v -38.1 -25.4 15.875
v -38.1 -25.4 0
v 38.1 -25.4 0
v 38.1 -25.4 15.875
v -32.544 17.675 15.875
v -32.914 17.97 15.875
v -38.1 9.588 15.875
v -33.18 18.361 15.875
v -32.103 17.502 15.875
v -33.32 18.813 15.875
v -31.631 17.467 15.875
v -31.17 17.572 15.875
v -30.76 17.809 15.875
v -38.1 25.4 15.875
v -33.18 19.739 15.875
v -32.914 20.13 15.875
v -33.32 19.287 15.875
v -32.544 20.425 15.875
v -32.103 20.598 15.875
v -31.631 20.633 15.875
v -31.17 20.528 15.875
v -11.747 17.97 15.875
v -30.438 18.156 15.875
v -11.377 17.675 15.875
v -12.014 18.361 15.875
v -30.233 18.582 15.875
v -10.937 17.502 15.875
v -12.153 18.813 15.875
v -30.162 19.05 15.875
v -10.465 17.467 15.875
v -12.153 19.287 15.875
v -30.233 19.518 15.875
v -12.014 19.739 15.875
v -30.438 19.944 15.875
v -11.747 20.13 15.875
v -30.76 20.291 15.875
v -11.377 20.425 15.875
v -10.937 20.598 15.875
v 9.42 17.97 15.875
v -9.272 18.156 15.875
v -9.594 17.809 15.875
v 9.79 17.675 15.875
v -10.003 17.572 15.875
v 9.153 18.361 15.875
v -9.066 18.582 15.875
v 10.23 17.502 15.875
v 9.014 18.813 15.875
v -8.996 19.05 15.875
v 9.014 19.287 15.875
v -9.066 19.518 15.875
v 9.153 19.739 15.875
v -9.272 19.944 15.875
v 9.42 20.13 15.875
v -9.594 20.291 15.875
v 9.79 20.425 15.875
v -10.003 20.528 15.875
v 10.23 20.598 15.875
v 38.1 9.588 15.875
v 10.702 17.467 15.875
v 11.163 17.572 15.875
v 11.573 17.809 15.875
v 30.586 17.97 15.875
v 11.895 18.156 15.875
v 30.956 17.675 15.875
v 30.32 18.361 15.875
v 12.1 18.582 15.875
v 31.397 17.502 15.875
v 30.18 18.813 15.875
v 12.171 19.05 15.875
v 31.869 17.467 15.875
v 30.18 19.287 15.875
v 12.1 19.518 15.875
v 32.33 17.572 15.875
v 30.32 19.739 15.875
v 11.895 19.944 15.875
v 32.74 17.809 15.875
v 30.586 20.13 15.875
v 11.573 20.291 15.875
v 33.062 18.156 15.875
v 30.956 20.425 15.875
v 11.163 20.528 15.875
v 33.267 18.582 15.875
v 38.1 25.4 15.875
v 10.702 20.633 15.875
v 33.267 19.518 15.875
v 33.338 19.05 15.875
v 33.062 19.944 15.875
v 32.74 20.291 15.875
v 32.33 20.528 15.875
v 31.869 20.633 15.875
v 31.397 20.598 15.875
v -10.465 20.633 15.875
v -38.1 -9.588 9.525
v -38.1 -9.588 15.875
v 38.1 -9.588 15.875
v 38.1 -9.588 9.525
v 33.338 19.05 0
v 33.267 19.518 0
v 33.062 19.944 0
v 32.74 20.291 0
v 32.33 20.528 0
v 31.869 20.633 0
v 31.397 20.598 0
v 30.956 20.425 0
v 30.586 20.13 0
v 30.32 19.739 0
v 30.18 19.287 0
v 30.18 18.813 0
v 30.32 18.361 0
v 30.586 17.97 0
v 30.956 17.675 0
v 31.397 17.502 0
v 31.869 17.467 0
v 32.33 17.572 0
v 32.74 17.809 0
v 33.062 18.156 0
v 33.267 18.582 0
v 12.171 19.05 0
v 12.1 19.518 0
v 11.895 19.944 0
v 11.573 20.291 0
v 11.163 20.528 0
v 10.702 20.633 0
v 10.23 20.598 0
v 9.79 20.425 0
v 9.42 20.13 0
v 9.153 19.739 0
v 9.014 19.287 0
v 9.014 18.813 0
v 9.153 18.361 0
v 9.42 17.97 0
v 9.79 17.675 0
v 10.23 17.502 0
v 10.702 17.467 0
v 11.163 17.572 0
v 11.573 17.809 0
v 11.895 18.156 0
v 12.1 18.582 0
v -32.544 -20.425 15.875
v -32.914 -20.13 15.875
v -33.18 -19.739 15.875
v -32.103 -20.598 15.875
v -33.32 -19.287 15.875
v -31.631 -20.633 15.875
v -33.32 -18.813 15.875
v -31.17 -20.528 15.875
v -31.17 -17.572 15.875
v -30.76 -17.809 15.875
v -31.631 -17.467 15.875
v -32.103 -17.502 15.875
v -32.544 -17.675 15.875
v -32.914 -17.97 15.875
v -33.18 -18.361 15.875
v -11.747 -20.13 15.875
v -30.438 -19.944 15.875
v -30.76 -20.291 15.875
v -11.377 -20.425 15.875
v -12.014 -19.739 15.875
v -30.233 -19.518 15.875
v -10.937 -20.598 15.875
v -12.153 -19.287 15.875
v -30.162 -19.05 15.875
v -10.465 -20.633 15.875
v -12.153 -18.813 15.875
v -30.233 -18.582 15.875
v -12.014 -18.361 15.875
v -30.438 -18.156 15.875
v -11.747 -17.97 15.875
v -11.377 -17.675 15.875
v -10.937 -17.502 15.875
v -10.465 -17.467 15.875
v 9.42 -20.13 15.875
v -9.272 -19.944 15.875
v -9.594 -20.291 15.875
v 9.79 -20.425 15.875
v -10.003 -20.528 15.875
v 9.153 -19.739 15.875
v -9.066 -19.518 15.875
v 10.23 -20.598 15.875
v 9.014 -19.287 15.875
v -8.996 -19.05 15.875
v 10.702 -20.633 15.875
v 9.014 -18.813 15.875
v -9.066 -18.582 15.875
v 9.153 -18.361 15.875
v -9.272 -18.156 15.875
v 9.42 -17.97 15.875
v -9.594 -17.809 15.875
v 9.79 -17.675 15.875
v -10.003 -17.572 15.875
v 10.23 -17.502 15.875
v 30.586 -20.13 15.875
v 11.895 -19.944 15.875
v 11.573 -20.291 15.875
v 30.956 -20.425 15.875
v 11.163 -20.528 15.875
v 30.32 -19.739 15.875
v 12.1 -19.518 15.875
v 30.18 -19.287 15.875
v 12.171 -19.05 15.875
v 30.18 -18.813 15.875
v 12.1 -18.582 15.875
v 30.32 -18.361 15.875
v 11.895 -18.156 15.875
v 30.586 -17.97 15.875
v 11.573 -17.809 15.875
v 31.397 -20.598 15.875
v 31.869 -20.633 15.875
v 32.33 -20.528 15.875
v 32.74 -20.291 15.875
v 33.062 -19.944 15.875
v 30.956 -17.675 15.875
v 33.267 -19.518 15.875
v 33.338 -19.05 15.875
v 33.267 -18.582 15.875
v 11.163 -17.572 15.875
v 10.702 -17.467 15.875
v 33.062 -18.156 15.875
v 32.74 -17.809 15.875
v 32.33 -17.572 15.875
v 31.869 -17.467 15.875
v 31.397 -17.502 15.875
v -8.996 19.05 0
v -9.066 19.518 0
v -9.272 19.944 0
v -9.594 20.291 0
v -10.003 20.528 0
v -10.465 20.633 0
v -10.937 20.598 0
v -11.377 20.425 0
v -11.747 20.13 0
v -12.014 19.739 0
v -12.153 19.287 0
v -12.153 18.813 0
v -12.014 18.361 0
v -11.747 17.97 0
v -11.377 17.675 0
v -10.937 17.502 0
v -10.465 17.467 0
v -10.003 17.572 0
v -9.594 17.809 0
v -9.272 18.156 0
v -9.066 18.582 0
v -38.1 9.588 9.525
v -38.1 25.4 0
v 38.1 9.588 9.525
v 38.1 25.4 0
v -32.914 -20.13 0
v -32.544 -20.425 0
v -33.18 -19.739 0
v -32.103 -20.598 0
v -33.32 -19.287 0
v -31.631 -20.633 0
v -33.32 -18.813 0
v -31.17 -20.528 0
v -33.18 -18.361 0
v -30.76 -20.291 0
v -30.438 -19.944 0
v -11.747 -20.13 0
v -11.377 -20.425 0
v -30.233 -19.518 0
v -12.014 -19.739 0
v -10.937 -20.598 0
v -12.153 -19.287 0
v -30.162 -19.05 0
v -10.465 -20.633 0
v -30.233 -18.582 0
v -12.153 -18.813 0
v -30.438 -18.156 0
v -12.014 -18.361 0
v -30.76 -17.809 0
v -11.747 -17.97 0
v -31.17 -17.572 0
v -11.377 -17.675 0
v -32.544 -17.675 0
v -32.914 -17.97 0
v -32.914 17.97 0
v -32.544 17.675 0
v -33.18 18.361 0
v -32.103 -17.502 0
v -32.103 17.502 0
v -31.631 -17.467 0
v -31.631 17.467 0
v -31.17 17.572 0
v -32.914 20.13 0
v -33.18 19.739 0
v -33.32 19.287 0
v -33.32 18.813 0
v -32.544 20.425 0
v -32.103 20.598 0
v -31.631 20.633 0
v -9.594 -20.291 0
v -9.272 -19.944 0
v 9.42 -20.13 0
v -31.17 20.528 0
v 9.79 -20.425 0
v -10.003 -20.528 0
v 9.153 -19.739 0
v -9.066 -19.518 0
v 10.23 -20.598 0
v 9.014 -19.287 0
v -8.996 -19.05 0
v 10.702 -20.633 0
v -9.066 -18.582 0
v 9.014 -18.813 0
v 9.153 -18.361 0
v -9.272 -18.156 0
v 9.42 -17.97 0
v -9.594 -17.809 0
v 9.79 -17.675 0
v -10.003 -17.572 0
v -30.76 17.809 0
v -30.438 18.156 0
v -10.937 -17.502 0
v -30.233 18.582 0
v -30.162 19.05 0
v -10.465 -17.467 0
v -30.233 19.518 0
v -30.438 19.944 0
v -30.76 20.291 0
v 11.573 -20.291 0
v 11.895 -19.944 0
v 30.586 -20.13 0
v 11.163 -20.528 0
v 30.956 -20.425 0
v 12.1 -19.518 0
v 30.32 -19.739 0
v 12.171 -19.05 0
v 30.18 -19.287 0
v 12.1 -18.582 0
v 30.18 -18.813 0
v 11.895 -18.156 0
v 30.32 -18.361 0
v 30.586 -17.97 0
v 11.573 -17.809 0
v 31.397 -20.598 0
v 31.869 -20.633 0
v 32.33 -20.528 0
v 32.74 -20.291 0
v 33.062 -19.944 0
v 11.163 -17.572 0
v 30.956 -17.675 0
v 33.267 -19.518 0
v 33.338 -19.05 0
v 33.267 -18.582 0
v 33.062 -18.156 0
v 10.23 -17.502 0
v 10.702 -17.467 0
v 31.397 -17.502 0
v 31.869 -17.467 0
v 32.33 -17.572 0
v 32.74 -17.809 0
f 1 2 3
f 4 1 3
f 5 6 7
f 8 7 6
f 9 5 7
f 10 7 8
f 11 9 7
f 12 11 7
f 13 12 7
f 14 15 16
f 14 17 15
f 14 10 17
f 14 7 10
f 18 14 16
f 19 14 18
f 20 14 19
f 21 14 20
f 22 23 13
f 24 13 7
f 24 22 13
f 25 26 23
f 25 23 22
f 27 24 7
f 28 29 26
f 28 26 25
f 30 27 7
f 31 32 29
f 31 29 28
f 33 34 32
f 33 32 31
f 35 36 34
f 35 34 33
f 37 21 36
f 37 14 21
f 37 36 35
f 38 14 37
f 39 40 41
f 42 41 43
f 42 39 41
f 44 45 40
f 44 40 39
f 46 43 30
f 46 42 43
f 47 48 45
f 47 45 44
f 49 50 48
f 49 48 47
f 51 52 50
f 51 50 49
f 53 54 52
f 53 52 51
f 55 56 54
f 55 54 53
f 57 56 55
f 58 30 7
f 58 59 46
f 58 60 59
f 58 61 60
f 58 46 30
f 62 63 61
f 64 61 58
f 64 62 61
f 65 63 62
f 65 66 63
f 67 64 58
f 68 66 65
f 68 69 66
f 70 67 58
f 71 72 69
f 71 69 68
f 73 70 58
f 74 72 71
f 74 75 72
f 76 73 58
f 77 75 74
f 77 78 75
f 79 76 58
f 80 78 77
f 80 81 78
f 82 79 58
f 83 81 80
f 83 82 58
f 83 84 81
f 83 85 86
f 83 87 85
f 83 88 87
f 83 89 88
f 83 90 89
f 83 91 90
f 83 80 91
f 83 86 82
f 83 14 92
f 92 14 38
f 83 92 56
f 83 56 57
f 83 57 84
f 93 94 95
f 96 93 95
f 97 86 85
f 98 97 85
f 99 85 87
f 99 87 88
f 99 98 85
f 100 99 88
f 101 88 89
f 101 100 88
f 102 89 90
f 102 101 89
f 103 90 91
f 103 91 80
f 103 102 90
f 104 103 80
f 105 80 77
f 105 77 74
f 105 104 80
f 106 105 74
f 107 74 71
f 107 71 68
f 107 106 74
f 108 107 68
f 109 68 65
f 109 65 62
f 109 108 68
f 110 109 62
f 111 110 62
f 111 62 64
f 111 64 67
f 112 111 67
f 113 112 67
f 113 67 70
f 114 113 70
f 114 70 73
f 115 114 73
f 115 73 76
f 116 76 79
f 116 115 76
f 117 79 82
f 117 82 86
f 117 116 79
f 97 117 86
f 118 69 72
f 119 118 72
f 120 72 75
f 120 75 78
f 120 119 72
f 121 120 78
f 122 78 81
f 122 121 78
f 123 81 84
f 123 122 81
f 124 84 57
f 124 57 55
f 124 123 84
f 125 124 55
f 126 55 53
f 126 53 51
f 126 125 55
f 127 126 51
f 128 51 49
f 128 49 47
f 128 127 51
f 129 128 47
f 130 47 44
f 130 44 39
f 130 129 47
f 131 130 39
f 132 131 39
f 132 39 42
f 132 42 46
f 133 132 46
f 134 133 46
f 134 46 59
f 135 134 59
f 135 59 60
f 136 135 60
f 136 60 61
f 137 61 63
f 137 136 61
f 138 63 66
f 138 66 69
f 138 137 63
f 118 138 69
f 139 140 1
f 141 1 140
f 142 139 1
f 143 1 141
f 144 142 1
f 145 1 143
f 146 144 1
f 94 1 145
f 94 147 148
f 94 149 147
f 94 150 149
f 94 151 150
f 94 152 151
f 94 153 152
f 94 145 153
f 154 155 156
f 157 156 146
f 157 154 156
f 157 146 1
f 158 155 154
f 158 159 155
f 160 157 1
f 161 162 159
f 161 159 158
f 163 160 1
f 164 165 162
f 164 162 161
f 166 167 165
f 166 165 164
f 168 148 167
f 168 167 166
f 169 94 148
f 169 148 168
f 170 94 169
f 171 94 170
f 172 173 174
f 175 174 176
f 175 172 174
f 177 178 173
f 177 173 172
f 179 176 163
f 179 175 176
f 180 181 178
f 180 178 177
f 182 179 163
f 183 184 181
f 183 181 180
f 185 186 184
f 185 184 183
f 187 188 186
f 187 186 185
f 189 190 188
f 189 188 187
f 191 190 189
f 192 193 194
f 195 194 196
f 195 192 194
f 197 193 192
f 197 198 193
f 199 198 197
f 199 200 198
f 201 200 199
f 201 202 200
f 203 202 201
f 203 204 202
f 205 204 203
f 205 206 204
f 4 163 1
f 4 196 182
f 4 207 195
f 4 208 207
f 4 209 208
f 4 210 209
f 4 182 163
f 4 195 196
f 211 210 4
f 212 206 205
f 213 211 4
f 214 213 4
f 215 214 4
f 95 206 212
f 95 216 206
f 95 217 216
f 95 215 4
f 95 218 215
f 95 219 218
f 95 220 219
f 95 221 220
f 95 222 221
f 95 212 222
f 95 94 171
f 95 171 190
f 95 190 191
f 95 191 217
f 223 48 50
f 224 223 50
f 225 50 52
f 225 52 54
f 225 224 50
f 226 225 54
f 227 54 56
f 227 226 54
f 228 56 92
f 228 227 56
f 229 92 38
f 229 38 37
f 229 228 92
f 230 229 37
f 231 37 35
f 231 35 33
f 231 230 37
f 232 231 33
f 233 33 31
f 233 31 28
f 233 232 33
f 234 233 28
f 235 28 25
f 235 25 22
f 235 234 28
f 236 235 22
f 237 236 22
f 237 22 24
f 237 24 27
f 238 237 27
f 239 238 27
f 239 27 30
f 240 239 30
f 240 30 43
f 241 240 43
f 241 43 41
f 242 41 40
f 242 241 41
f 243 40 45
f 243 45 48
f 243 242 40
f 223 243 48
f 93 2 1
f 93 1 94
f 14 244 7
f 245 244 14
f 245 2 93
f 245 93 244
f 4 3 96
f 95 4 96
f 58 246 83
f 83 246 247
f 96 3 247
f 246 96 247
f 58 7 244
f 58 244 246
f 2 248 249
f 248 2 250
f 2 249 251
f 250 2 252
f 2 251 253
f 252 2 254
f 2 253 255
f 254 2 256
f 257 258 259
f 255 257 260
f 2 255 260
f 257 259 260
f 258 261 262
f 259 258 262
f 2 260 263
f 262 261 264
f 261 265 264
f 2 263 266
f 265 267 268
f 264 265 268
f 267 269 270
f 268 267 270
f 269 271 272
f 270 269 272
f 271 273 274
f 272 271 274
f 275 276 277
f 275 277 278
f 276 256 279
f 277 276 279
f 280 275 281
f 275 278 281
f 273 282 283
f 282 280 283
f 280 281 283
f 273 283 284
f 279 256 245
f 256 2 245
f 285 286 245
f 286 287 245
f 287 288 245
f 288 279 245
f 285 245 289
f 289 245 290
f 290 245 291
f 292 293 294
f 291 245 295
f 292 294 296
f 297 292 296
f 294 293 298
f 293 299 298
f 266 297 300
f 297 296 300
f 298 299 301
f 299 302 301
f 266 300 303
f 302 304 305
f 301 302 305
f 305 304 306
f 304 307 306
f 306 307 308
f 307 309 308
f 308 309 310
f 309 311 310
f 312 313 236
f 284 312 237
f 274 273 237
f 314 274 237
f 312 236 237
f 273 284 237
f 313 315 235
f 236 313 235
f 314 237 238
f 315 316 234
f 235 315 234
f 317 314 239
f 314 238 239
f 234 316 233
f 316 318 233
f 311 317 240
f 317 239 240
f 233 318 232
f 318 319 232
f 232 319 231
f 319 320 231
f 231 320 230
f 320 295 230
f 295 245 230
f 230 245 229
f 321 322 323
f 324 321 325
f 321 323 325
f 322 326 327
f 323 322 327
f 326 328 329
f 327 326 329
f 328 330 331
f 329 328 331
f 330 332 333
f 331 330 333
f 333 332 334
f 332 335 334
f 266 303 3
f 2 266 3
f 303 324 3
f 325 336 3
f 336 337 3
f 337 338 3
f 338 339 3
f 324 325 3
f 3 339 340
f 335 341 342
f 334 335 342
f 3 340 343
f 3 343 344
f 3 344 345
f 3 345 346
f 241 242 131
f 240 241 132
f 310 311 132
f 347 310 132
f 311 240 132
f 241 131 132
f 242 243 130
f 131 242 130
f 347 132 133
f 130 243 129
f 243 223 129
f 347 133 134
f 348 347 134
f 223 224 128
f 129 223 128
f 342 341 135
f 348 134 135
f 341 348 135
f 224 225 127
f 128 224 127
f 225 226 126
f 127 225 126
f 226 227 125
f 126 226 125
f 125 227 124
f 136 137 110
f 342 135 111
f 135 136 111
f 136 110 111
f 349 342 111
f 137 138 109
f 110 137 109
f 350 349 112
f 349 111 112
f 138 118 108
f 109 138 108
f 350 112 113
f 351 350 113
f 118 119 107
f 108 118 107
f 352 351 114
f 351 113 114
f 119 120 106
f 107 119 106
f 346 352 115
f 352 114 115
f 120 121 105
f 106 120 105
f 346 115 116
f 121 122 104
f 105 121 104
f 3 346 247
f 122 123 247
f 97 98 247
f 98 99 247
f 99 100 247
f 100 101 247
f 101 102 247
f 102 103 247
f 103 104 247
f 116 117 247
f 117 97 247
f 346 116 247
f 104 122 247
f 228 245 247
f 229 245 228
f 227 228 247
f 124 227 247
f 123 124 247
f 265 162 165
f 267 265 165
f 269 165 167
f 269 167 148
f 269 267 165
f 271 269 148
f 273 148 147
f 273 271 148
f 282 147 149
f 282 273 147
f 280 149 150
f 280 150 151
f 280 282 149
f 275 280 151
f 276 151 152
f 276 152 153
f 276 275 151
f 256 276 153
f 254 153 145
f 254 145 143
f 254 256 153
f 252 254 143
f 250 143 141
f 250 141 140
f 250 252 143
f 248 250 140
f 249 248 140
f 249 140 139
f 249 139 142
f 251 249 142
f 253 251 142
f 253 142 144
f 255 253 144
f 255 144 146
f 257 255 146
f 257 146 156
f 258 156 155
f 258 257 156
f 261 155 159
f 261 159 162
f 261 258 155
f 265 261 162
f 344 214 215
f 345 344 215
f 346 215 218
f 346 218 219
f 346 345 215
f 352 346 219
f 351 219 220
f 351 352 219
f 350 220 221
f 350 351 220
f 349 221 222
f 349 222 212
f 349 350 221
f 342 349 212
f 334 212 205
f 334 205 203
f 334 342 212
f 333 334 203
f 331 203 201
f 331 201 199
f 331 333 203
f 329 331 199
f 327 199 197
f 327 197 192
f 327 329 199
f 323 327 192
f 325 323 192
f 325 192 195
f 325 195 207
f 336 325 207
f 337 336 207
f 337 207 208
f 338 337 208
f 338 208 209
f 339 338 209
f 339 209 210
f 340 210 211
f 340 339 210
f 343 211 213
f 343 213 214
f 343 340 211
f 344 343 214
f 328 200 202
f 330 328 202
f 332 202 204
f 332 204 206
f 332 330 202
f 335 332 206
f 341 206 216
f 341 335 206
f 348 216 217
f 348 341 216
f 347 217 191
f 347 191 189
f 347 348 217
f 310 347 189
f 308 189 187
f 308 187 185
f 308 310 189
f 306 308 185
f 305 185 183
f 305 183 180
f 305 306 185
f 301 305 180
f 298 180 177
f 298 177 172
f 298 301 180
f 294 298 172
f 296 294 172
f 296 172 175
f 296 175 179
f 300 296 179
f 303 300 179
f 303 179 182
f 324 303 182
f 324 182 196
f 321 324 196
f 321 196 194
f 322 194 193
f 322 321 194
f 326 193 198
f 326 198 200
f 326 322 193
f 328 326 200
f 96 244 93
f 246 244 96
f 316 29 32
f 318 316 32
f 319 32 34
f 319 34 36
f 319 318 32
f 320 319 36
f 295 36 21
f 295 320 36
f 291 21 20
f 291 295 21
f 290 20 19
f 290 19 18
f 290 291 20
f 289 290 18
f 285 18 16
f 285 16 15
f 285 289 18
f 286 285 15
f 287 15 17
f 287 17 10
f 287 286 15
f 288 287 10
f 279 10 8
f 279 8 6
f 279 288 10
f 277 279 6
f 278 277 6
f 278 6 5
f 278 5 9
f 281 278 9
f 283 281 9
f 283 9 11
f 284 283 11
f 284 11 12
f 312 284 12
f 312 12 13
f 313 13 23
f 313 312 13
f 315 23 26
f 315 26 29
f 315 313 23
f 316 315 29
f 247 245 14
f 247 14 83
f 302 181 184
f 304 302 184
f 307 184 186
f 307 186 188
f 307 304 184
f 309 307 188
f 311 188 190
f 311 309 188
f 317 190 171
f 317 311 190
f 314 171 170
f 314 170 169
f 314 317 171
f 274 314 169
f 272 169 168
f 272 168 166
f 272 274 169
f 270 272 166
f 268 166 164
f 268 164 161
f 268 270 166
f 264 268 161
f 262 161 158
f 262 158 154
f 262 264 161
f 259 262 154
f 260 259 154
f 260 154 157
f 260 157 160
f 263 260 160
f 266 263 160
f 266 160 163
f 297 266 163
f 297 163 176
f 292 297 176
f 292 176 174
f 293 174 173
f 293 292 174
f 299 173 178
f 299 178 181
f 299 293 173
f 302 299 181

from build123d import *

# Parameters (mm, degrees)
F0_W     = 76.2
F0_H     = 50.8
F0_R     = 1.5875
F1_DEPTH = 15.875
F2_W     = 76.2
F2_H     = 19.177
F3_DEPTH = 6.35


with BuildPart() as f1:
    # F0 (on Top) → F1 (new body)
    with BuildSketch(Plane.XY):
        Rectangle(F0_W, F0_H)
        with Locations((-31.75, -19.05)):
            Circle(F0_R, mode=Mode.SUBTRACT)
        with Locations((-10.583333, -19.05)):
            Circle(F0_R, mode=Mode.SUBTRACT)
        with Locations((10.583333, -19.05)):
            Circle(F0_R, mode=Mode.SUBTRACT)
        with Locations((31.75, -19.05)):
            Circle(F0_R, mode=Mode.SUBTRACT)
        with Locations((-31.75, 19.05)):
            Circle(F0_R, mode=Mode.SUBTRACT)
        with Locations((-10.583333, 19.05)):
            Circle(F0_R, mode=Mode.SUBTRACT)
        with Locations((10.583333, 19.05)):
            Circle(F0_R, mode=Mode.SUBTRACT)
        with Locations((31.75, 19.05)):
            Circle(F0_R, mode=Mode.SUBTRACT)
    extrude(amount=F1_DEPTH)

    # F2 (on face) → F3 (cut)
    with BuildSketch(Plane.XY.offset(15.875)):
        Rectangle(F2_W, F2_H)
    extrude(amount=-F3_DEPTH, mode=Mode.SUBTRACT)


solid = f1.part
